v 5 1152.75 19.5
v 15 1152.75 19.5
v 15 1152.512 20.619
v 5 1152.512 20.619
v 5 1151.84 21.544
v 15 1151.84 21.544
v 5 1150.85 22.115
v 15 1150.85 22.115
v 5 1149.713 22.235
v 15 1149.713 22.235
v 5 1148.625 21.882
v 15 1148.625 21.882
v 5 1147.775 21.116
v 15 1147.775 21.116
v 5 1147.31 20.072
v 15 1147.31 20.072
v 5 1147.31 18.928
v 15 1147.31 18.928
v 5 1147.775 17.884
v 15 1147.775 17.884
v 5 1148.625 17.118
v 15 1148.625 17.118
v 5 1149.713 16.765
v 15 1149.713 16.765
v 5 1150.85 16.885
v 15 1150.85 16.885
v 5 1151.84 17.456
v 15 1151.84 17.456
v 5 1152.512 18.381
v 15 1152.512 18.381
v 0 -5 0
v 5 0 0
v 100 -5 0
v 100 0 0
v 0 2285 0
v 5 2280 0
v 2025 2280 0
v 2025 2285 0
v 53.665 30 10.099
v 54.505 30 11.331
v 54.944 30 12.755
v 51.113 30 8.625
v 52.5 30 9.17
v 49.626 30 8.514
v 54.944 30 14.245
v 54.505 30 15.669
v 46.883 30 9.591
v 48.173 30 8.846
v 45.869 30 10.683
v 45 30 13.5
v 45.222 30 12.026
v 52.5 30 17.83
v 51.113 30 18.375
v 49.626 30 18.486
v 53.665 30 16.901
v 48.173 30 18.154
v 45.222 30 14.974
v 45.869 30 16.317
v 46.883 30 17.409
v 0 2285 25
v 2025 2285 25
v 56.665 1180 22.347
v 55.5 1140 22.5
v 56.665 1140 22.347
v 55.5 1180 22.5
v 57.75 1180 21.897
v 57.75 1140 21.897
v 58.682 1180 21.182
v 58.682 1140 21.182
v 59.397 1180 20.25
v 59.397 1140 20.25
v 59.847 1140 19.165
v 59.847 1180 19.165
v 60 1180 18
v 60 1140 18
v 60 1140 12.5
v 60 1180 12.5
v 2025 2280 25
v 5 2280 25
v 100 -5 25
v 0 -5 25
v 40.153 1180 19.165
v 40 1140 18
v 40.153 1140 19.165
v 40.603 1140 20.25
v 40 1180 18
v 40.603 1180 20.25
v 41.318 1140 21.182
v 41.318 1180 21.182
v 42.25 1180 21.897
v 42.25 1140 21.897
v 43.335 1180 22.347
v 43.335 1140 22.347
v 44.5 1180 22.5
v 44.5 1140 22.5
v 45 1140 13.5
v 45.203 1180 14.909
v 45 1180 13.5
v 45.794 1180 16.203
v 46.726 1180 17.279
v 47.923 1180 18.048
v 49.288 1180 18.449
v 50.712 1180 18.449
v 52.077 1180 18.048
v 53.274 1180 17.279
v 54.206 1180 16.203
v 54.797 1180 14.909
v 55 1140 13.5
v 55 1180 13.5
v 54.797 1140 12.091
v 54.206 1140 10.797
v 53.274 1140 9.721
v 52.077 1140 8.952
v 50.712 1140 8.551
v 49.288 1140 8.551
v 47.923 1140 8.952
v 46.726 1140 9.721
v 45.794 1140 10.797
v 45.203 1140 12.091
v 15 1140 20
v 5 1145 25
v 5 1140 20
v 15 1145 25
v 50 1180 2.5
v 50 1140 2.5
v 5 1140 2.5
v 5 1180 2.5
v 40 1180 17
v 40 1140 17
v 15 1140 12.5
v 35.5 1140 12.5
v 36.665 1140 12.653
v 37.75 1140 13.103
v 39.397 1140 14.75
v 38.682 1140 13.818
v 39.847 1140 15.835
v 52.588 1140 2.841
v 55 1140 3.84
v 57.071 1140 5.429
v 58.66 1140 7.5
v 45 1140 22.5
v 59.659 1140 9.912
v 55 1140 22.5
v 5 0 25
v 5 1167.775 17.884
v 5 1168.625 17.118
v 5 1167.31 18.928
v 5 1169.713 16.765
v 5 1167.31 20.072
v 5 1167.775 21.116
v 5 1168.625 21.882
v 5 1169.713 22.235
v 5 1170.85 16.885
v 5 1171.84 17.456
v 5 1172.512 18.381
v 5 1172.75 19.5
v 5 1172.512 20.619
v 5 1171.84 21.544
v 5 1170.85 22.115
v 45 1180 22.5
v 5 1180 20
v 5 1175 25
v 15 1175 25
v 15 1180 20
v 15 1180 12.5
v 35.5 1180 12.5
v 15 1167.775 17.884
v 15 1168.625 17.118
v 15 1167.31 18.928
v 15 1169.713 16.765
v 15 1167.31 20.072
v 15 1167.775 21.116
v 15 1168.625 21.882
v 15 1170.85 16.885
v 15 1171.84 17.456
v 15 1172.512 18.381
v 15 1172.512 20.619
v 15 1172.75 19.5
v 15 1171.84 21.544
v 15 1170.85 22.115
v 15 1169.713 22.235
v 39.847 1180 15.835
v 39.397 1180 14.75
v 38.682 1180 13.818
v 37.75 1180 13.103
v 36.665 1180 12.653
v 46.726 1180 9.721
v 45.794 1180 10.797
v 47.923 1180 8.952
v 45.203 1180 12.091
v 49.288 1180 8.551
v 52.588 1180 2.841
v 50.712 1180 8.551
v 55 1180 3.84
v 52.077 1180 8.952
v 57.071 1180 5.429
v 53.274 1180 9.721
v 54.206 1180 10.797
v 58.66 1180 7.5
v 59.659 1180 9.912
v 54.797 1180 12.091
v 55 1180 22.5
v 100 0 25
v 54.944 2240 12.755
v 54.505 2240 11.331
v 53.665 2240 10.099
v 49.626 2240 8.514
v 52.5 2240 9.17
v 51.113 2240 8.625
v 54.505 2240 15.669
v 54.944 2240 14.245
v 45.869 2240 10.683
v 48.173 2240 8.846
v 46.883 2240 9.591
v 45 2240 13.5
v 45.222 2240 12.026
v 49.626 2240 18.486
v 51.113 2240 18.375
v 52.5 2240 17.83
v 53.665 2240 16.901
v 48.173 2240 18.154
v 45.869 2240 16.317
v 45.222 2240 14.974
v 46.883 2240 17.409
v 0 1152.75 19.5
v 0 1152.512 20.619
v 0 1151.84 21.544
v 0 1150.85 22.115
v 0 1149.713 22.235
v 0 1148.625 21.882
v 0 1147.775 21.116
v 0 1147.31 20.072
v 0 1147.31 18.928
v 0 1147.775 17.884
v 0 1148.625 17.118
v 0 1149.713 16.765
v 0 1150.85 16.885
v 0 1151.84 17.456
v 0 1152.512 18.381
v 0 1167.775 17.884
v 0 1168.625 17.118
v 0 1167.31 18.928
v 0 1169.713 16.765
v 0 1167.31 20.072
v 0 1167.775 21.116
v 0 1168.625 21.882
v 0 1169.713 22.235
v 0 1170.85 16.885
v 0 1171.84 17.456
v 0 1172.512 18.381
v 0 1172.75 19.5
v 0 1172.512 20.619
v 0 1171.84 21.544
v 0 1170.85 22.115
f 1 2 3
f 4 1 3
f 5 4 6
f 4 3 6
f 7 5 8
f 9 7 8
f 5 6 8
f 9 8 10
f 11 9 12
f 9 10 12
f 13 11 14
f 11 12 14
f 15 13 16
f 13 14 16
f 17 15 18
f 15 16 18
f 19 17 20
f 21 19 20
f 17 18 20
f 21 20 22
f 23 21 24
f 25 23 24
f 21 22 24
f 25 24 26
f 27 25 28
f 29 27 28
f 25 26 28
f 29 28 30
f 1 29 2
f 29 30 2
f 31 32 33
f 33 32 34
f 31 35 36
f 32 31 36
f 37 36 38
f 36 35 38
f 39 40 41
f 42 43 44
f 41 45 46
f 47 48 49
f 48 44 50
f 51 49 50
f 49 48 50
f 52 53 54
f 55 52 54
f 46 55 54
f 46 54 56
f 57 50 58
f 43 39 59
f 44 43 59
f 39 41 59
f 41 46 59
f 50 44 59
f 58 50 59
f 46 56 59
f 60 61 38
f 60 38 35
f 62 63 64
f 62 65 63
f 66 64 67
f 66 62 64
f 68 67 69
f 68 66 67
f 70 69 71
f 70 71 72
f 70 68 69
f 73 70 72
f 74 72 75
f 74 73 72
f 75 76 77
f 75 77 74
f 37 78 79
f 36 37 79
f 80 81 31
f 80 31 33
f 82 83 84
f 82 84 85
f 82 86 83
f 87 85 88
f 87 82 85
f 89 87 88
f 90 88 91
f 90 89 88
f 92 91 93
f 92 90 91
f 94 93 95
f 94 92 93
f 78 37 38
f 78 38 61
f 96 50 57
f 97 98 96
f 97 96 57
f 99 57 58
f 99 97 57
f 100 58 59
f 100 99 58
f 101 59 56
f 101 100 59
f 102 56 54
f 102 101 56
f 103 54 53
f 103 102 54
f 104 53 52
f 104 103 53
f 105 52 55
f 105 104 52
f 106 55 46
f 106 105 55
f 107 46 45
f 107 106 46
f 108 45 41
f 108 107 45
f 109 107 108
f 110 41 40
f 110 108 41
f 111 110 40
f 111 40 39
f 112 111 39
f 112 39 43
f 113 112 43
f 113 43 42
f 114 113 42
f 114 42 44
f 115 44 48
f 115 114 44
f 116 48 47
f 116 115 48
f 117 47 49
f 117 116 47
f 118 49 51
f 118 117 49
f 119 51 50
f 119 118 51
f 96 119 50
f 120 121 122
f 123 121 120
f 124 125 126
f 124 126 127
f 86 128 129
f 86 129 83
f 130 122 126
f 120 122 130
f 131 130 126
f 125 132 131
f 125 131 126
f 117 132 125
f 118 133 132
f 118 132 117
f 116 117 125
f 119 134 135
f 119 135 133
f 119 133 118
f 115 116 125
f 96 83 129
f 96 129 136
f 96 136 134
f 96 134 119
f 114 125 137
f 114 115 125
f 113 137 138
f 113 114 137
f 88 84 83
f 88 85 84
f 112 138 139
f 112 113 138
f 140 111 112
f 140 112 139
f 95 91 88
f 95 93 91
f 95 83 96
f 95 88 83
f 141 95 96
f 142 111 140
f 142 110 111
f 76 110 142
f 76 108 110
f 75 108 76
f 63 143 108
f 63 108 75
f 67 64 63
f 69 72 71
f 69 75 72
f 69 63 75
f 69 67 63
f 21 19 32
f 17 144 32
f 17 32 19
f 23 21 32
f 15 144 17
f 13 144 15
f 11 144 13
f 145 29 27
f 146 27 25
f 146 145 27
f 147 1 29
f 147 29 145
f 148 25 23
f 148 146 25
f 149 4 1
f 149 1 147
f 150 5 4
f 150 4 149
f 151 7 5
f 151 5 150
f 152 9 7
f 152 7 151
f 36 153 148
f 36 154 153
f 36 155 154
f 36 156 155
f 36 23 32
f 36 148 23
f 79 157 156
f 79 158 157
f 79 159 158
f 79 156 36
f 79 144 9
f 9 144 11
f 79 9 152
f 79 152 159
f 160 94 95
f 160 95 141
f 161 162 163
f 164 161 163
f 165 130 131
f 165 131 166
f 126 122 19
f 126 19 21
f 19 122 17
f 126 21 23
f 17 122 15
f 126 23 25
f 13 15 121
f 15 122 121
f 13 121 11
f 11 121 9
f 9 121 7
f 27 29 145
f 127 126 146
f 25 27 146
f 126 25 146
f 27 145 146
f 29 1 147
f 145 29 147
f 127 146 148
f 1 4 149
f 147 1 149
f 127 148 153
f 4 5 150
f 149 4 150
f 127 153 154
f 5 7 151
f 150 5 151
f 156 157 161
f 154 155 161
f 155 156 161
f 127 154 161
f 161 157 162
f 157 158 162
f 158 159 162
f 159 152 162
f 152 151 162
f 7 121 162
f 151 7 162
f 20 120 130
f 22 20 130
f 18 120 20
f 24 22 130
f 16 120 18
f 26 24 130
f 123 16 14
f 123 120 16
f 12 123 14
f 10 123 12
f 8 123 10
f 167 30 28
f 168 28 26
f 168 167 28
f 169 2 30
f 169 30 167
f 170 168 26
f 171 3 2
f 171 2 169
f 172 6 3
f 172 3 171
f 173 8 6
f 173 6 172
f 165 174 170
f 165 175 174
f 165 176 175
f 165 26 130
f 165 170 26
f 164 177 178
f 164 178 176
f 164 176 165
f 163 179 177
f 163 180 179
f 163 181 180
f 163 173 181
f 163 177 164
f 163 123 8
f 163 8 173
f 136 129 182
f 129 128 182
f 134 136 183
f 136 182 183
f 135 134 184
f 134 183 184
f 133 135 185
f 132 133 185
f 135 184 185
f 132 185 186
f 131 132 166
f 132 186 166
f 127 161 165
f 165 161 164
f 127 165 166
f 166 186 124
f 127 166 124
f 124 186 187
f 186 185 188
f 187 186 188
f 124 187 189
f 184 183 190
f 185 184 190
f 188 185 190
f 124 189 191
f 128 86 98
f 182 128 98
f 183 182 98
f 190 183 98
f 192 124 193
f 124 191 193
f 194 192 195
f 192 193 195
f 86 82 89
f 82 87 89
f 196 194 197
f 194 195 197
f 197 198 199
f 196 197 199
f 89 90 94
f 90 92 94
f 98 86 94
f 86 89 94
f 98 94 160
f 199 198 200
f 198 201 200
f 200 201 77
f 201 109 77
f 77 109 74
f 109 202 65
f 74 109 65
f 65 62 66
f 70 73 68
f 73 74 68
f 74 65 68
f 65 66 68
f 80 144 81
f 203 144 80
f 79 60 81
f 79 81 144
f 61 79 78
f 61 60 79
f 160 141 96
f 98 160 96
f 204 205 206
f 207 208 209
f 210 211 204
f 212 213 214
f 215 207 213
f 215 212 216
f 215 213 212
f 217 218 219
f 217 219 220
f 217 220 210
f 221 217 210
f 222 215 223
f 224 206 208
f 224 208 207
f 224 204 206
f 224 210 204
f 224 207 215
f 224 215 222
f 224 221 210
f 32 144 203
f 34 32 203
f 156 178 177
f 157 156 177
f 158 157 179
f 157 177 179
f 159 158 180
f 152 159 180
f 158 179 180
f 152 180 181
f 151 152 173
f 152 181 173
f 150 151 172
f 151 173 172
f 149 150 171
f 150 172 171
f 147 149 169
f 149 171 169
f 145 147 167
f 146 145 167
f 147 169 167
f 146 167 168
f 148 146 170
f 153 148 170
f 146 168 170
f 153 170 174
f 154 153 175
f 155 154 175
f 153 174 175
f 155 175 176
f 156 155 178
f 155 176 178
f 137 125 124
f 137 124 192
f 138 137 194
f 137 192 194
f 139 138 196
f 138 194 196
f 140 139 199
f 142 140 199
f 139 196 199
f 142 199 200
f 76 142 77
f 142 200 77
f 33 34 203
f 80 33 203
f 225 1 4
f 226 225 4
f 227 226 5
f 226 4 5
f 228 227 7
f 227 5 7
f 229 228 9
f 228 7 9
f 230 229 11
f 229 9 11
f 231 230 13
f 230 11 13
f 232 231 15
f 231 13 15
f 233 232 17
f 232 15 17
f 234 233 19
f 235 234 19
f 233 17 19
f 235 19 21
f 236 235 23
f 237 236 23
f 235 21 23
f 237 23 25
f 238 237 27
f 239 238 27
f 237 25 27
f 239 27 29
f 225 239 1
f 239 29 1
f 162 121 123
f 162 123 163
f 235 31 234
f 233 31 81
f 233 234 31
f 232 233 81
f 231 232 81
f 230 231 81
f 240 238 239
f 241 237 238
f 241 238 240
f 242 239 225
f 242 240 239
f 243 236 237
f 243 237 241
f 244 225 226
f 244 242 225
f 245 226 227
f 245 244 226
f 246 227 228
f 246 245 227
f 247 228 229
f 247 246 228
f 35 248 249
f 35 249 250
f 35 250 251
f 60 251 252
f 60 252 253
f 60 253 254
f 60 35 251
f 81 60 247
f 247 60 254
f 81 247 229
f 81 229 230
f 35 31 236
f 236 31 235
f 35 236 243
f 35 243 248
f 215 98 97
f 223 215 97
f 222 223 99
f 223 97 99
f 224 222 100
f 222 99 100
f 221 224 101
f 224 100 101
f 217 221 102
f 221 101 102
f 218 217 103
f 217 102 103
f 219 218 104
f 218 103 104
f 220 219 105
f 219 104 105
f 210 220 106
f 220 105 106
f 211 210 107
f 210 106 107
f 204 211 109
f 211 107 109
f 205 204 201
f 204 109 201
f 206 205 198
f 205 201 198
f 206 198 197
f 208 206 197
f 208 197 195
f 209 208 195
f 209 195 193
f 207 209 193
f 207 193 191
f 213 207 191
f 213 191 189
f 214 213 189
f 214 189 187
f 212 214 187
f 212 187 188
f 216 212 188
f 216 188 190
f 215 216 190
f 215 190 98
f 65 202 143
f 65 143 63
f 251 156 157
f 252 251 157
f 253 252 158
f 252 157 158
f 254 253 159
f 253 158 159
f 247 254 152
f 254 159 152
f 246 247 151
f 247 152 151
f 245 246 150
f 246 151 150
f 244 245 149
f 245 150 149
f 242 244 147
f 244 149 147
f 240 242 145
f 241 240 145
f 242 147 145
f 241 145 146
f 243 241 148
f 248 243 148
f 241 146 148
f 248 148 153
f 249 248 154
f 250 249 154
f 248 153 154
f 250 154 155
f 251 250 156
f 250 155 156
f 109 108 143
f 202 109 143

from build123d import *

# Parameters (mm, degrees)
F0_W           = 2280
F0_H           = 25
F1_DEPTH       = 5
F2_W           = 2025
F2_H           = 25
F3_DEPTH       = 5
F4_W           = 100
F4_H           = 25
F5_DEPTH       = 5
F6_W           = 40
F6_H           = 22.5
F7_DEPTH       = 10
F8_SIZE        = 5
F9_W           = 40
F9_H           = 10
F10_DEPTH      = 45
F11_W          = 20
F11_H          = 10
F12_DEPTH      = 40
F14_DEPTH      = 1145.001
F15_R          = 4.5
F16_R          = 10
F17_R          = 2.75
F18_DEPTH      = 15.001
F19_R          = 5
F20_DEPTH      = 1060
F20_DEPTH_BACK = 1150


with BuildPart() as f1:
    # F0 (on Right) → F1 (new body)
    with BuildSketch(Plane.YZ):
        with Locations((1140, 12.5)):
            Rectangle(F0_W, F0_H)
    extrude(amount=F1_DEPTH)

    # F2 (on face) → F3 (join)
    with BuildSketch(Plane(origin=(0, 2280, 0), x_dir=(-1, 0, 0), z_dir=(0, 1, 0))):
        with Locations((-1012.5, 12.5)):
            Rectangle(F2_W, F2_H)
    extrude(amount=F3_DEPTH)

    # F4 (on face) → F5 (join)
    with BuildSketch(Plane.XZ):
        with Locations((50, 12.5)):
            Rectangle(F4_W, F4_H)
    extrude(amount=F5_DEPTH)


with BuildPart() as f7:
    # F6 (on face) → F7 (new body)
    with BuildSketch(Plane.YZ.offset(5)):
        with Locations((1160, 13.75)):
            Rectangle(F6_W, F6_H)
    extrude(amount=F7_DEPTH)

    # F8
    f8_edges = [f7.edges().sort_by_distance(p)[0] for p in [
        (10, 1140, 25),
        (10, 1180, 25),
    ]]
    chamfer(f8_edges, length=F8_SIZE)

    # F9 (on face) → F10 (join)
    with BuildSketch(Plane.YZ.offset(15)):
        with Locations((1160, 7.5)):
            Rectangle(F9_W, F9_H)
    extrude(amount=F10_DEPTH)

    # F11 (on face) → F12 (join, through all)
    with BuildSketch(Plane.XZ.offset(-1140)):
        with Locations((50, 17.5)):
            Rectangle(F11_W, F11_H)
    extrude(amount=-F12_DEPTH)

    # F13 (on face) → F14 (cut, through all)
    with BuildSketch(Plane.XZ.offset(-1140)):
        with BuildLine():
            Line((45, 22.5), (45, 13.5))
            ThreePointArc((45, 13.5), (50, 8.5), (55, 13.5))
            Line((55, 13.5), (55, 22.5))
            Line((55, 22.5), (45, 22.5))
        make_face()
    extrude(amount=-F14_DEPTH, mode=Mode.SUBTRACT)

    # F15
    f15_edges = [f7.edges().sort_by_distance(p)[0] for p in [
        (60, 1160, 22.5),
        (40, 1160, 22.5),
        (40, 1160, 12.5),
    ]]
    fillet(f15_edges, radius=F15_R)

    # F16
    f16_edges = [f7.edges().sort_by_distance(p)[0] for p in [
        (60, 1160, 2.5),
    ]]
    fillet(f16_edges, radius=F16_R)


with BuildPart() as f18_tool:
    # F17 (on face) → F18 (new body, through all)
    with BuildSketch(Plane.YZ.offset(15)):
        with Locations((1150, 19.5)):
            Circle(F17_R)
        with Locations((1170, 19.5)):
            Circle(F17_R)
    extrude(amount=-F18_DEPTH)


with BuildPart() as f1_1:
    add(f1.part)

    # F18: cut by f18_tool
    add(f18_tool.part, mode=Mode.SUBTRACT)


with BuildPart() as f7_1:
    add(f7.part)

    # F18: cut by f18_tool
    add(f18_tool.part, mode=Mode.SUBTRACT)

    # F19 (on face) → F20 (join, two sides)
    with BuildSketch(Plane(origin=(0, 1180, 0), x_dir=(-1, 0, 0), z_dir=(0, 1, 0))) as f20_sk:
        with Locations((-50, 13.5)):
            Circle(F19_R)
    extrude(amount=F20_DEPTH)
    extrude(f20_sk.sketch, amount=-F20_DEPTH_BACK)


solid = Compound([f1_1.part, f7_1.part])
